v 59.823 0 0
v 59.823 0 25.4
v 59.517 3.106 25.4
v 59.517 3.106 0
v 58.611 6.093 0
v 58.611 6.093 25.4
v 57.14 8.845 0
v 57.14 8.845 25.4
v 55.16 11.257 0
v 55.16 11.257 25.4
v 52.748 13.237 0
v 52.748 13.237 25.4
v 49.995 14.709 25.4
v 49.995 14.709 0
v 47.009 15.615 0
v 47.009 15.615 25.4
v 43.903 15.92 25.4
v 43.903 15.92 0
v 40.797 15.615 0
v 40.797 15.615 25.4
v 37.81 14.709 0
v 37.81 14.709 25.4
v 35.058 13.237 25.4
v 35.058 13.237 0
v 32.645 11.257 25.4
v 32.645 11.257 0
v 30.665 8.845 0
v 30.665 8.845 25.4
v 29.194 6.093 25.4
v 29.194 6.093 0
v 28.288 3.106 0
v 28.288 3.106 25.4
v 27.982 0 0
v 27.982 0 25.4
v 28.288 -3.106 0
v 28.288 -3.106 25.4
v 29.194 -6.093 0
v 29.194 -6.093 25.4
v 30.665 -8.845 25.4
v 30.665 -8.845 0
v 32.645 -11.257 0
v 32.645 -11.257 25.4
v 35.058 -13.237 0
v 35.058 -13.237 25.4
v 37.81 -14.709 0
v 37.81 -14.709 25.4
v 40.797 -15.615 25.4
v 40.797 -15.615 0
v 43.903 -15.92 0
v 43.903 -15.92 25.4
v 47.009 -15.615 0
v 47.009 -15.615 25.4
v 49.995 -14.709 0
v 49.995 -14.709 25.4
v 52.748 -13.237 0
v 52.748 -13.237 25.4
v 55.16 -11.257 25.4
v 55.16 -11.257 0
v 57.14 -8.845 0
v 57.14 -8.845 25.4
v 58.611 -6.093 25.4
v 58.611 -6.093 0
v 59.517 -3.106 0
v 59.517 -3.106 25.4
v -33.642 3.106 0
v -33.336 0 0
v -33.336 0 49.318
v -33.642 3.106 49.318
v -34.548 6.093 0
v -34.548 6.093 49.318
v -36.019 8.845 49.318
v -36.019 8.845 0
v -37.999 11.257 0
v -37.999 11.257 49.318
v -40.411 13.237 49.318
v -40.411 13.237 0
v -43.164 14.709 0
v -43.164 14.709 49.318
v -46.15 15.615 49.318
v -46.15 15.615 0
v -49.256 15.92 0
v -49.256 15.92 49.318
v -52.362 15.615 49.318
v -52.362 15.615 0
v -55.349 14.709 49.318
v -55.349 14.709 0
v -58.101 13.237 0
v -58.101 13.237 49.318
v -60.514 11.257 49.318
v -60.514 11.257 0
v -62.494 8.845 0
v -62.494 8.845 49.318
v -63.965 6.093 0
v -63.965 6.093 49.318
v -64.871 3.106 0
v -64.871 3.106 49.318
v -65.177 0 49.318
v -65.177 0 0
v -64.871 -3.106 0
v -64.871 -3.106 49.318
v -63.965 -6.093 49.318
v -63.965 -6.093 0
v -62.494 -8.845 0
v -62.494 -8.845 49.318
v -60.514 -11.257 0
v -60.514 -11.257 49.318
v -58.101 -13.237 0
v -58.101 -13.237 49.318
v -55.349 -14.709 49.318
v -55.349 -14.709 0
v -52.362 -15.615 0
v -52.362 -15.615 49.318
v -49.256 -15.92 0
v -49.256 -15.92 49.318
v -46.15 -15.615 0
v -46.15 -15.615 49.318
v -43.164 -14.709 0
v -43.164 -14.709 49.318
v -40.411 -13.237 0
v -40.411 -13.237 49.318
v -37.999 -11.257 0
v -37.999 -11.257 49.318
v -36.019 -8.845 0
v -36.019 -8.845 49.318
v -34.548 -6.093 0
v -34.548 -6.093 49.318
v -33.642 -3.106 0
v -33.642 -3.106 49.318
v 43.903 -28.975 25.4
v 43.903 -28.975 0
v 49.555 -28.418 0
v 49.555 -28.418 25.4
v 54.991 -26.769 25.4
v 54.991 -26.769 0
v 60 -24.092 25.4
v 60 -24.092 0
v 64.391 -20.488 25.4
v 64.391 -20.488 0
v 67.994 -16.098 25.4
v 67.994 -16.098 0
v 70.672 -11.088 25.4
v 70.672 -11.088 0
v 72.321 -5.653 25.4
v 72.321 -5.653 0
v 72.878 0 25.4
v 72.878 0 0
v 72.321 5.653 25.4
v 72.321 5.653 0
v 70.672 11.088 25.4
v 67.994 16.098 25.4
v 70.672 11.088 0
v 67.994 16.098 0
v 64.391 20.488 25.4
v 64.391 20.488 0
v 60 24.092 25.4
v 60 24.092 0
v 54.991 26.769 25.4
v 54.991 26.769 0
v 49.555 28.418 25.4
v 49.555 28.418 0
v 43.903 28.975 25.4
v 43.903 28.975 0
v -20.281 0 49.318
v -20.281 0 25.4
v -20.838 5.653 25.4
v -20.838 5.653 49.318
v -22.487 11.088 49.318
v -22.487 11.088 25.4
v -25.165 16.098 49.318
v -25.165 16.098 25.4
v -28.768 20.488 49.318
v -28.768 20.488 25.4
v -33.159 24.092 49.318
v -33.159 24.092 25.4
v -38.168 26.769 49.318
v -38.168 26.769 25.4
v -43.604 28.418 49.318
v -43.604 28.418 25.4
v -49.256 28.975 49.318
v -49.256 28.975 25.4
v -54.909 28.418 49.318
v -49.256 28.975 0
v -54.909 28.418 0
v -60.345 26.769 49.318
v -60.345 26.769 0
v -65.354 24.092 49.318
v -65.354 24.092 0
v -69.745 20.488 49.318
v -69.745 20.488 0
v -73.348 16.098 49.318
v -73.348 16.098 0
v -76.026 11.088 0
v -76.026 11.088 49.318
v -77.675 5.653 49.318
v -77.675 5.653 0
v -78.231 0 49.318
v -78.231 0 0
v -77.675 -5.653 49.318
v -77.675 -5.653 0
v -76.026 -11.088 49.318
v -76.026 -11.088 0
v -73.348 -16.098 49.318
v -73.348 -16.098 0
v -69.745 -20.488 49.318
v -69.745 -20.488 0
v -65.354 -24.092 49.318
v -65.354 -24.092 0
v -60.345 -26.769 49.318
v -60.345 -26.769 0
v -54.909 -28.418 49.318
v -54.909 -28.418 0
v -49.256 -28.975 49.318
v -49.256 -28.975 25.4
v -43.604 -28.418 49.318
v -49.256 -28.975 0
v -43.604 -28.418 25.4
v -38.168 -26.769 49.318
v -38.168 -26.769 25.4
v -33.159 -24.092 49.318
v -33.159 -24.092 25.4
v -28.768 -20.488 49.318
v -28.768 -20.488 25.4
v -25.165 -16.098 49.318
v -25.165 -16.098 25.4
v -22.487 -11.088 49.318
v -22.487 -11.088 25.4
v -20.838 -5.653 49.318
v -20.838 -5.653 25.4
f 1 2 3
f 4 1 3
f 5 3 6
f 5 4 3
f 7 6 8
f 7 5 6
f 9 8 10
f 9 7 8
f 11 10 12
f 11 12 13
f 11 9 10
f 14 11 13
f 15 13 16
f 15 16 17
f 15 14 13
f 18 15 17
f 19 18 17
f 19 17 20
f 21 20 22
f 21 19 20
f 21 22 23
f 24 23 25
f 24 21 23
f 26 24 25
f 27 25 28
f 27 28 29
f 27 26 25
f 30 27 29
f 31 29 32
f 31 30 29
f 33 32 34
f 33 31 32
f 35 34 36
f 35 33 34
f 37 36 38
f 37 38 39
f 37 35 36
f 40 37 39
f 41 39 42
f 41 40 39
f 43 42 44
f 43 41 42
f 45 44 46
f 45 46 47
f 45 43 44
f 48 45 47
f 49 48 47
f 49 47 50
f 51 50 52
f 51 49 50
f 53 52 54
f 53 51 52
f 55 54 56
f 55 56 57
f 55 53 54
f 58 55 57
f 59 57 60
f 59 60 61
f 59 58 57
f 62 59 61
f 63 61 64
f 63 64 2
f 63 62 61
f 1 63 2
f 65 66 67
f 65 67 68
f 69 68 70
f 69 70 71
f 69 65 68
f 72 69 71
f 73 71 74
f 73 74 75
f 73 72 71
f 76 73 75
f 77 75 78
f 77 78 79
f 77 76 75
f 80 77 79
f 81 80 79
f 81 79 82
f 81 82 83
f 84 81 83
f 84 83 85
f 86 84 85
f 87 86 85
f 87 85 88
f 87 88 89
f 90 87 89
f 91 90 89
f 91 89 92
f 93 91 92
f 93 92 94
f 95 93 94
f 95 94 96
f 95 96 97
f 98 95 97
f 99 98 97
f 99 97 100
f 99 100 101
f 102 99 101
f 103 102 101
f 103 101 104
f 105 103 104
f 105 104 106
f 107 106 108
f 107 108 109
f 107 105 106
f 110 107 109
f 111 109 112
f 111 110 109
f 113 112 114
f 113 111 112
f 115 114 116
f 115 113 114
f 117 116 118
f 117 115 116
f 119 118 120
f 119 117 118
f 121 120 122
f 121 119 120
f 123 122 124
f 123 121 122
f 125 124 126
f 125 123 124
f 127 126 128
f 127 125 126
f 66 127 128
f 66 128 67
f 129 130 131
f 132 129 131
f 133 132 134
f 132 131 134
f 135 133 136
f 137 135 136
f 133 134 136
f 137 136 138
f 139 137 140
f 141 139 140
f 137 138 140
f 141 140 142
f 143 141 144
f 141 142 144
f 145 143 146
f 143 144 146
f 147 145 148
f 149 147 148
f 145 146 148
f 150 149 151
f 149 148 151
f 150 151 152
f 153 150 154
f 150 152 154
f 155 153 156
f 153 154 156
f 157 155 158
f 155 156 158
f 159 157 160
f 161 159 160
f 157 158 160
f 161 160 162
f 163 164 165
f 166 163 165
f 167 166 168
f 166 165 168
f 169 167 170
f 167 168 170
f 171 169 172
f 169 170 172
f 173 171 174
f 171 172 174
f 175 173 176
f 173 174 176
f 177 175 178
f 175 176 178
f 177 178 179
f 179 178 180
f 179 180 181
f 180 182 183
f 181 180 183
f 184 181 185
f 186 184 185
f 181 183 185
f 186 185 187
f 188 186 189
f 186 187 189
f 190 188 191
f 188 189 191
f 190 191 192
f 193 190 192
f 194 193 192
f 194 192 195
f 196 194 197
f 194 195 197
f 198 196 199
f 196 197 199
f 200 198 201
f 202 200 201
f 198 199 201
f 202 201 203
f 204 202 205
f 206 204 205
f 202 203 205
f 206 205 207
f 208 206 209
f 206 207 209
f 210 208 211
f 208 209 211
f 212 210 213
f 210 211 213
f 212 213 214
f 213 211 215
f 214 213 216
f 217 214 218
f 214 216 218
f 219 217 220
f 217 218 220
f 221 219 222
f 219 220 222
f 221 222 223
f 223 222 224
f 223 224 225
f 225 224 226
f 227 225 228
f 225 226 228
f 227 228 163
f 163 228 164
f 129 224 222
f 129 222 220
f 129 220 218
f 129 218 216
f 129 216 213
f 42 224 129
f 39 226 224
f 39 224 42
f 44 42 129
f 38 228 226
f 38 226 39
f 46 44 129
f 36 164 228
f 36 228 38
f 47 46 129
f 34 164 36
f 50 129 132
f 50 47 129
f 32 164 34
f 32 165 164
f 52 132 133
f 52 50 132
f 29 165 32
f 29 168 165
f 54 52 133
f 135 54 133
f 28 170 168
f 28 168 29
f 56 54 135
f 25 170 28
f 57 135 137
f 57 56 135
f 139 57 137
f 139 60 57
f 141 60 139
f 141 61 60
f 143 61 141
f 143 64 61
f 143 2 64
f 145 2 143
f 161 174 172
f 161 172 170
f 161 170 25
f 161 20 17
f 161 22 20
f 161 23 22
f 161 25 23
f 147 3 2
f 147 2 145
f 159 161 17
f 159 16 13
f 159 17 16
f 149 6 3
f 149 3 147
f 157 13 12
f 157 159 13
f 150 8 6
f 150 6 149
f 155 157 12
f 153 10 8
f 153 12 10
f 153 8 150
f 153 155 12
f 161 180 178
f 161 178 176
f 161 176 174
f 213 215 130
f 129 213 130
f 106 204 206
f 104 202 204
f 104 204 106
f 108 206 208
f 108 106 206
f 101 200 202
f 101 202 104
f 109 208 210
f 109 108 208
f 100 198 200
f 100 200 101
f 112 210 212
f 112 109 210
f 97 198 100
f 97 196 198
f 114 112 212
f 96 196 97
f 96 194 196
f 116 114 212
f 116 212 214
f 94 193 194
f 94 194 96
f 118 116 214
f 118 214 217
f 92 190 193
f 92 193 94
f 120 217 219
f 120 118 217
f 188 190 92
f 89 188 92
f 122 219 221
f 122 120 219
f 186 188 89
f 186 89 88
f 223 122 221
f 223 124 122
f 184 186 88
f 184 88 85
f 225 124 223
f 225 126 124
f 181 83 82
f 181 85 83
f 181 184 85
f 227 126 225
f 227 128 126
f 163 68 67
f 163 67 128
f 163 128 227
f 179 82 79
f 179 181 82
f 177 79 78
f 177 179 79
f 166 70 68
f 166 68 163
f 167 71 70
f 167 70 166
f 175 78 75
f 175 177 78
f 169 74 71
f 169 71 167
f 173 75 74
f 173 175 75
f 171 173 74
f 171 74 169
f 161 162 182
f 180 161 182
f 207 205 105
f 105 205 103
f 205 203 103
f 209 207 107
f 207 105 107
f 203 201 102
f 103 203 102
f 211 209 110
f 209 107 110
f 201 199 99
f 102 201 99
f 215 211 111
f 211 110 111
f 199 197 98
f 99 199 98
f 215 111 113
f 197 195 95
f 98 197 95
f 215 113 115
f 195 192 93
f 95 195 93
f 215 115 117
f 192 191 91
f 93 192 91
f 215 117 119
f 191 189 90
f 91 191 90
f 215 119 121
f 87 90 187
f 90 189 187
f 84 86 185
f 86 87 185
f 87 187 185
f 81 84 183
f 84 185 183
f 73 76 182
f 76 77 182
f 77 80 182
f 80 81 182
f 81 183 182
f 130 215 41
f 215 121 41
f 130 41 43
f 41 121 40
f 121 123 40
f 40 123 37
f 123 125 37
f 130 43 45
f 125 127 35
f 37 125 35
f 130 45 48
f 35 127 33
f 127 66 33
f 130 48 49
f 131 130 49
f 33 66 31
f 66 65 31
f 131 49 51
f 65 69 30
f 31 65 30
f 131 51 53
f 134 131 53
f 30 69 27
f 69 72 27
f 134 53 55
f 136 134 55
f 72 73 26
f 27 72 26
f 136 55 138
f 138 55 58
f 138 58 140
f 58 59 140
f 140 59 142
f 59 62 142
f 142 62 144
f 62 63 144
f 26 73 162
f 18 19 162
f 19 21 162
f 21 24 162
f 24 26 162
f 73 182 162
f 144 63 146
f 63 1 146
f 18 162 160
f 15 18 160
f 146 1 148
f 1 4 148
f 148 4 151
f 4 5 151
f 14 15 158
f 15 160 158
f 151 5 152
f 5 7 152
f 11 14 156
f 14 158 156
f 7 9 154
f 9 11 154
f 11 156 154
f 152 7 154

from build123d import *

# Parameters (mm, degrees)
F0_R     = 15.9205
F1_DEPTH = 25.4
F2_DEPTH = 49.318


# Not quite as in the source:
# - a feature names something its author has since deleted; it is built from what else it names


with BuildPart() as f1:
    # F0 (on Top) → F1 (new body)
    with BuildSketch(Plane.XY):
        with BuildLine():
            Line((-49.2564179003, -28.975), (43.9025820997, -28.975))
            ThreePointArc((43.9025820997, -28.975), (72.8775820997, 0), (43.9025820997, 28.975))
            Line((43.9025820997, 28.975), (-49.2564179003, 28.975))
            ThreePointArc((-49.2564179003, 28.975), (-28.7679989154, 20.4884189849), (-20.2814179003, 0))
            ThreePointArc((-20.2814179003, 0), (-28.7679989154, -20.4884189849), (-49.2564179003, -28.975))
        make_face()
        with Locations((43.9025820997, 0)):
            Circle(F0_R, mode=Mode.SUBTRACT)
        with BuildLine():
            ThreePointArc((-49.2564179003, 28.975), (-78.2314179003, 0), (-49.2564179003, -28.975))
            ThreePointArc((-49.2564179003, -28.975), (-28.7679989154, -20.4884189849), (-20.2814179003, 0))
            ThreePointArc((-20.2814179003, 0), (-28.7679989154, 20.4884189849), (-49.2564179003, 28.975))
        make_face()
        with Locations((-49.2564179003, 0)):
            Circle(F0_R, mode=Mode.SUBTRACT)
    extrude(amount=F1_DEPTH)

    # F0 (on Top) → F2 (join)
    with BuildSketch(Plane.XY):
        with BuildLine():
            ThreePointArc((-49.2564179003, 28.975), (-78.2314179003, 0), (-49.2564179003, -28.975))
            ThreePointArc((-49.2564179003, -28.975), (-28.7679989154, -20.4884189849), (-20.2814179003, 0))
            ThreePointArc((-20.2814179003, 0), (-28.7679989154, 20.4884189849), (-49.2564179003, 28.975))
        make_face()
        with Locations((-49.2564179003, 0)):
            Circle(F0_R, mode=Mode.SUBTRACT)
    extrude(amount=F2_DEPTH)


solid = f1.part
